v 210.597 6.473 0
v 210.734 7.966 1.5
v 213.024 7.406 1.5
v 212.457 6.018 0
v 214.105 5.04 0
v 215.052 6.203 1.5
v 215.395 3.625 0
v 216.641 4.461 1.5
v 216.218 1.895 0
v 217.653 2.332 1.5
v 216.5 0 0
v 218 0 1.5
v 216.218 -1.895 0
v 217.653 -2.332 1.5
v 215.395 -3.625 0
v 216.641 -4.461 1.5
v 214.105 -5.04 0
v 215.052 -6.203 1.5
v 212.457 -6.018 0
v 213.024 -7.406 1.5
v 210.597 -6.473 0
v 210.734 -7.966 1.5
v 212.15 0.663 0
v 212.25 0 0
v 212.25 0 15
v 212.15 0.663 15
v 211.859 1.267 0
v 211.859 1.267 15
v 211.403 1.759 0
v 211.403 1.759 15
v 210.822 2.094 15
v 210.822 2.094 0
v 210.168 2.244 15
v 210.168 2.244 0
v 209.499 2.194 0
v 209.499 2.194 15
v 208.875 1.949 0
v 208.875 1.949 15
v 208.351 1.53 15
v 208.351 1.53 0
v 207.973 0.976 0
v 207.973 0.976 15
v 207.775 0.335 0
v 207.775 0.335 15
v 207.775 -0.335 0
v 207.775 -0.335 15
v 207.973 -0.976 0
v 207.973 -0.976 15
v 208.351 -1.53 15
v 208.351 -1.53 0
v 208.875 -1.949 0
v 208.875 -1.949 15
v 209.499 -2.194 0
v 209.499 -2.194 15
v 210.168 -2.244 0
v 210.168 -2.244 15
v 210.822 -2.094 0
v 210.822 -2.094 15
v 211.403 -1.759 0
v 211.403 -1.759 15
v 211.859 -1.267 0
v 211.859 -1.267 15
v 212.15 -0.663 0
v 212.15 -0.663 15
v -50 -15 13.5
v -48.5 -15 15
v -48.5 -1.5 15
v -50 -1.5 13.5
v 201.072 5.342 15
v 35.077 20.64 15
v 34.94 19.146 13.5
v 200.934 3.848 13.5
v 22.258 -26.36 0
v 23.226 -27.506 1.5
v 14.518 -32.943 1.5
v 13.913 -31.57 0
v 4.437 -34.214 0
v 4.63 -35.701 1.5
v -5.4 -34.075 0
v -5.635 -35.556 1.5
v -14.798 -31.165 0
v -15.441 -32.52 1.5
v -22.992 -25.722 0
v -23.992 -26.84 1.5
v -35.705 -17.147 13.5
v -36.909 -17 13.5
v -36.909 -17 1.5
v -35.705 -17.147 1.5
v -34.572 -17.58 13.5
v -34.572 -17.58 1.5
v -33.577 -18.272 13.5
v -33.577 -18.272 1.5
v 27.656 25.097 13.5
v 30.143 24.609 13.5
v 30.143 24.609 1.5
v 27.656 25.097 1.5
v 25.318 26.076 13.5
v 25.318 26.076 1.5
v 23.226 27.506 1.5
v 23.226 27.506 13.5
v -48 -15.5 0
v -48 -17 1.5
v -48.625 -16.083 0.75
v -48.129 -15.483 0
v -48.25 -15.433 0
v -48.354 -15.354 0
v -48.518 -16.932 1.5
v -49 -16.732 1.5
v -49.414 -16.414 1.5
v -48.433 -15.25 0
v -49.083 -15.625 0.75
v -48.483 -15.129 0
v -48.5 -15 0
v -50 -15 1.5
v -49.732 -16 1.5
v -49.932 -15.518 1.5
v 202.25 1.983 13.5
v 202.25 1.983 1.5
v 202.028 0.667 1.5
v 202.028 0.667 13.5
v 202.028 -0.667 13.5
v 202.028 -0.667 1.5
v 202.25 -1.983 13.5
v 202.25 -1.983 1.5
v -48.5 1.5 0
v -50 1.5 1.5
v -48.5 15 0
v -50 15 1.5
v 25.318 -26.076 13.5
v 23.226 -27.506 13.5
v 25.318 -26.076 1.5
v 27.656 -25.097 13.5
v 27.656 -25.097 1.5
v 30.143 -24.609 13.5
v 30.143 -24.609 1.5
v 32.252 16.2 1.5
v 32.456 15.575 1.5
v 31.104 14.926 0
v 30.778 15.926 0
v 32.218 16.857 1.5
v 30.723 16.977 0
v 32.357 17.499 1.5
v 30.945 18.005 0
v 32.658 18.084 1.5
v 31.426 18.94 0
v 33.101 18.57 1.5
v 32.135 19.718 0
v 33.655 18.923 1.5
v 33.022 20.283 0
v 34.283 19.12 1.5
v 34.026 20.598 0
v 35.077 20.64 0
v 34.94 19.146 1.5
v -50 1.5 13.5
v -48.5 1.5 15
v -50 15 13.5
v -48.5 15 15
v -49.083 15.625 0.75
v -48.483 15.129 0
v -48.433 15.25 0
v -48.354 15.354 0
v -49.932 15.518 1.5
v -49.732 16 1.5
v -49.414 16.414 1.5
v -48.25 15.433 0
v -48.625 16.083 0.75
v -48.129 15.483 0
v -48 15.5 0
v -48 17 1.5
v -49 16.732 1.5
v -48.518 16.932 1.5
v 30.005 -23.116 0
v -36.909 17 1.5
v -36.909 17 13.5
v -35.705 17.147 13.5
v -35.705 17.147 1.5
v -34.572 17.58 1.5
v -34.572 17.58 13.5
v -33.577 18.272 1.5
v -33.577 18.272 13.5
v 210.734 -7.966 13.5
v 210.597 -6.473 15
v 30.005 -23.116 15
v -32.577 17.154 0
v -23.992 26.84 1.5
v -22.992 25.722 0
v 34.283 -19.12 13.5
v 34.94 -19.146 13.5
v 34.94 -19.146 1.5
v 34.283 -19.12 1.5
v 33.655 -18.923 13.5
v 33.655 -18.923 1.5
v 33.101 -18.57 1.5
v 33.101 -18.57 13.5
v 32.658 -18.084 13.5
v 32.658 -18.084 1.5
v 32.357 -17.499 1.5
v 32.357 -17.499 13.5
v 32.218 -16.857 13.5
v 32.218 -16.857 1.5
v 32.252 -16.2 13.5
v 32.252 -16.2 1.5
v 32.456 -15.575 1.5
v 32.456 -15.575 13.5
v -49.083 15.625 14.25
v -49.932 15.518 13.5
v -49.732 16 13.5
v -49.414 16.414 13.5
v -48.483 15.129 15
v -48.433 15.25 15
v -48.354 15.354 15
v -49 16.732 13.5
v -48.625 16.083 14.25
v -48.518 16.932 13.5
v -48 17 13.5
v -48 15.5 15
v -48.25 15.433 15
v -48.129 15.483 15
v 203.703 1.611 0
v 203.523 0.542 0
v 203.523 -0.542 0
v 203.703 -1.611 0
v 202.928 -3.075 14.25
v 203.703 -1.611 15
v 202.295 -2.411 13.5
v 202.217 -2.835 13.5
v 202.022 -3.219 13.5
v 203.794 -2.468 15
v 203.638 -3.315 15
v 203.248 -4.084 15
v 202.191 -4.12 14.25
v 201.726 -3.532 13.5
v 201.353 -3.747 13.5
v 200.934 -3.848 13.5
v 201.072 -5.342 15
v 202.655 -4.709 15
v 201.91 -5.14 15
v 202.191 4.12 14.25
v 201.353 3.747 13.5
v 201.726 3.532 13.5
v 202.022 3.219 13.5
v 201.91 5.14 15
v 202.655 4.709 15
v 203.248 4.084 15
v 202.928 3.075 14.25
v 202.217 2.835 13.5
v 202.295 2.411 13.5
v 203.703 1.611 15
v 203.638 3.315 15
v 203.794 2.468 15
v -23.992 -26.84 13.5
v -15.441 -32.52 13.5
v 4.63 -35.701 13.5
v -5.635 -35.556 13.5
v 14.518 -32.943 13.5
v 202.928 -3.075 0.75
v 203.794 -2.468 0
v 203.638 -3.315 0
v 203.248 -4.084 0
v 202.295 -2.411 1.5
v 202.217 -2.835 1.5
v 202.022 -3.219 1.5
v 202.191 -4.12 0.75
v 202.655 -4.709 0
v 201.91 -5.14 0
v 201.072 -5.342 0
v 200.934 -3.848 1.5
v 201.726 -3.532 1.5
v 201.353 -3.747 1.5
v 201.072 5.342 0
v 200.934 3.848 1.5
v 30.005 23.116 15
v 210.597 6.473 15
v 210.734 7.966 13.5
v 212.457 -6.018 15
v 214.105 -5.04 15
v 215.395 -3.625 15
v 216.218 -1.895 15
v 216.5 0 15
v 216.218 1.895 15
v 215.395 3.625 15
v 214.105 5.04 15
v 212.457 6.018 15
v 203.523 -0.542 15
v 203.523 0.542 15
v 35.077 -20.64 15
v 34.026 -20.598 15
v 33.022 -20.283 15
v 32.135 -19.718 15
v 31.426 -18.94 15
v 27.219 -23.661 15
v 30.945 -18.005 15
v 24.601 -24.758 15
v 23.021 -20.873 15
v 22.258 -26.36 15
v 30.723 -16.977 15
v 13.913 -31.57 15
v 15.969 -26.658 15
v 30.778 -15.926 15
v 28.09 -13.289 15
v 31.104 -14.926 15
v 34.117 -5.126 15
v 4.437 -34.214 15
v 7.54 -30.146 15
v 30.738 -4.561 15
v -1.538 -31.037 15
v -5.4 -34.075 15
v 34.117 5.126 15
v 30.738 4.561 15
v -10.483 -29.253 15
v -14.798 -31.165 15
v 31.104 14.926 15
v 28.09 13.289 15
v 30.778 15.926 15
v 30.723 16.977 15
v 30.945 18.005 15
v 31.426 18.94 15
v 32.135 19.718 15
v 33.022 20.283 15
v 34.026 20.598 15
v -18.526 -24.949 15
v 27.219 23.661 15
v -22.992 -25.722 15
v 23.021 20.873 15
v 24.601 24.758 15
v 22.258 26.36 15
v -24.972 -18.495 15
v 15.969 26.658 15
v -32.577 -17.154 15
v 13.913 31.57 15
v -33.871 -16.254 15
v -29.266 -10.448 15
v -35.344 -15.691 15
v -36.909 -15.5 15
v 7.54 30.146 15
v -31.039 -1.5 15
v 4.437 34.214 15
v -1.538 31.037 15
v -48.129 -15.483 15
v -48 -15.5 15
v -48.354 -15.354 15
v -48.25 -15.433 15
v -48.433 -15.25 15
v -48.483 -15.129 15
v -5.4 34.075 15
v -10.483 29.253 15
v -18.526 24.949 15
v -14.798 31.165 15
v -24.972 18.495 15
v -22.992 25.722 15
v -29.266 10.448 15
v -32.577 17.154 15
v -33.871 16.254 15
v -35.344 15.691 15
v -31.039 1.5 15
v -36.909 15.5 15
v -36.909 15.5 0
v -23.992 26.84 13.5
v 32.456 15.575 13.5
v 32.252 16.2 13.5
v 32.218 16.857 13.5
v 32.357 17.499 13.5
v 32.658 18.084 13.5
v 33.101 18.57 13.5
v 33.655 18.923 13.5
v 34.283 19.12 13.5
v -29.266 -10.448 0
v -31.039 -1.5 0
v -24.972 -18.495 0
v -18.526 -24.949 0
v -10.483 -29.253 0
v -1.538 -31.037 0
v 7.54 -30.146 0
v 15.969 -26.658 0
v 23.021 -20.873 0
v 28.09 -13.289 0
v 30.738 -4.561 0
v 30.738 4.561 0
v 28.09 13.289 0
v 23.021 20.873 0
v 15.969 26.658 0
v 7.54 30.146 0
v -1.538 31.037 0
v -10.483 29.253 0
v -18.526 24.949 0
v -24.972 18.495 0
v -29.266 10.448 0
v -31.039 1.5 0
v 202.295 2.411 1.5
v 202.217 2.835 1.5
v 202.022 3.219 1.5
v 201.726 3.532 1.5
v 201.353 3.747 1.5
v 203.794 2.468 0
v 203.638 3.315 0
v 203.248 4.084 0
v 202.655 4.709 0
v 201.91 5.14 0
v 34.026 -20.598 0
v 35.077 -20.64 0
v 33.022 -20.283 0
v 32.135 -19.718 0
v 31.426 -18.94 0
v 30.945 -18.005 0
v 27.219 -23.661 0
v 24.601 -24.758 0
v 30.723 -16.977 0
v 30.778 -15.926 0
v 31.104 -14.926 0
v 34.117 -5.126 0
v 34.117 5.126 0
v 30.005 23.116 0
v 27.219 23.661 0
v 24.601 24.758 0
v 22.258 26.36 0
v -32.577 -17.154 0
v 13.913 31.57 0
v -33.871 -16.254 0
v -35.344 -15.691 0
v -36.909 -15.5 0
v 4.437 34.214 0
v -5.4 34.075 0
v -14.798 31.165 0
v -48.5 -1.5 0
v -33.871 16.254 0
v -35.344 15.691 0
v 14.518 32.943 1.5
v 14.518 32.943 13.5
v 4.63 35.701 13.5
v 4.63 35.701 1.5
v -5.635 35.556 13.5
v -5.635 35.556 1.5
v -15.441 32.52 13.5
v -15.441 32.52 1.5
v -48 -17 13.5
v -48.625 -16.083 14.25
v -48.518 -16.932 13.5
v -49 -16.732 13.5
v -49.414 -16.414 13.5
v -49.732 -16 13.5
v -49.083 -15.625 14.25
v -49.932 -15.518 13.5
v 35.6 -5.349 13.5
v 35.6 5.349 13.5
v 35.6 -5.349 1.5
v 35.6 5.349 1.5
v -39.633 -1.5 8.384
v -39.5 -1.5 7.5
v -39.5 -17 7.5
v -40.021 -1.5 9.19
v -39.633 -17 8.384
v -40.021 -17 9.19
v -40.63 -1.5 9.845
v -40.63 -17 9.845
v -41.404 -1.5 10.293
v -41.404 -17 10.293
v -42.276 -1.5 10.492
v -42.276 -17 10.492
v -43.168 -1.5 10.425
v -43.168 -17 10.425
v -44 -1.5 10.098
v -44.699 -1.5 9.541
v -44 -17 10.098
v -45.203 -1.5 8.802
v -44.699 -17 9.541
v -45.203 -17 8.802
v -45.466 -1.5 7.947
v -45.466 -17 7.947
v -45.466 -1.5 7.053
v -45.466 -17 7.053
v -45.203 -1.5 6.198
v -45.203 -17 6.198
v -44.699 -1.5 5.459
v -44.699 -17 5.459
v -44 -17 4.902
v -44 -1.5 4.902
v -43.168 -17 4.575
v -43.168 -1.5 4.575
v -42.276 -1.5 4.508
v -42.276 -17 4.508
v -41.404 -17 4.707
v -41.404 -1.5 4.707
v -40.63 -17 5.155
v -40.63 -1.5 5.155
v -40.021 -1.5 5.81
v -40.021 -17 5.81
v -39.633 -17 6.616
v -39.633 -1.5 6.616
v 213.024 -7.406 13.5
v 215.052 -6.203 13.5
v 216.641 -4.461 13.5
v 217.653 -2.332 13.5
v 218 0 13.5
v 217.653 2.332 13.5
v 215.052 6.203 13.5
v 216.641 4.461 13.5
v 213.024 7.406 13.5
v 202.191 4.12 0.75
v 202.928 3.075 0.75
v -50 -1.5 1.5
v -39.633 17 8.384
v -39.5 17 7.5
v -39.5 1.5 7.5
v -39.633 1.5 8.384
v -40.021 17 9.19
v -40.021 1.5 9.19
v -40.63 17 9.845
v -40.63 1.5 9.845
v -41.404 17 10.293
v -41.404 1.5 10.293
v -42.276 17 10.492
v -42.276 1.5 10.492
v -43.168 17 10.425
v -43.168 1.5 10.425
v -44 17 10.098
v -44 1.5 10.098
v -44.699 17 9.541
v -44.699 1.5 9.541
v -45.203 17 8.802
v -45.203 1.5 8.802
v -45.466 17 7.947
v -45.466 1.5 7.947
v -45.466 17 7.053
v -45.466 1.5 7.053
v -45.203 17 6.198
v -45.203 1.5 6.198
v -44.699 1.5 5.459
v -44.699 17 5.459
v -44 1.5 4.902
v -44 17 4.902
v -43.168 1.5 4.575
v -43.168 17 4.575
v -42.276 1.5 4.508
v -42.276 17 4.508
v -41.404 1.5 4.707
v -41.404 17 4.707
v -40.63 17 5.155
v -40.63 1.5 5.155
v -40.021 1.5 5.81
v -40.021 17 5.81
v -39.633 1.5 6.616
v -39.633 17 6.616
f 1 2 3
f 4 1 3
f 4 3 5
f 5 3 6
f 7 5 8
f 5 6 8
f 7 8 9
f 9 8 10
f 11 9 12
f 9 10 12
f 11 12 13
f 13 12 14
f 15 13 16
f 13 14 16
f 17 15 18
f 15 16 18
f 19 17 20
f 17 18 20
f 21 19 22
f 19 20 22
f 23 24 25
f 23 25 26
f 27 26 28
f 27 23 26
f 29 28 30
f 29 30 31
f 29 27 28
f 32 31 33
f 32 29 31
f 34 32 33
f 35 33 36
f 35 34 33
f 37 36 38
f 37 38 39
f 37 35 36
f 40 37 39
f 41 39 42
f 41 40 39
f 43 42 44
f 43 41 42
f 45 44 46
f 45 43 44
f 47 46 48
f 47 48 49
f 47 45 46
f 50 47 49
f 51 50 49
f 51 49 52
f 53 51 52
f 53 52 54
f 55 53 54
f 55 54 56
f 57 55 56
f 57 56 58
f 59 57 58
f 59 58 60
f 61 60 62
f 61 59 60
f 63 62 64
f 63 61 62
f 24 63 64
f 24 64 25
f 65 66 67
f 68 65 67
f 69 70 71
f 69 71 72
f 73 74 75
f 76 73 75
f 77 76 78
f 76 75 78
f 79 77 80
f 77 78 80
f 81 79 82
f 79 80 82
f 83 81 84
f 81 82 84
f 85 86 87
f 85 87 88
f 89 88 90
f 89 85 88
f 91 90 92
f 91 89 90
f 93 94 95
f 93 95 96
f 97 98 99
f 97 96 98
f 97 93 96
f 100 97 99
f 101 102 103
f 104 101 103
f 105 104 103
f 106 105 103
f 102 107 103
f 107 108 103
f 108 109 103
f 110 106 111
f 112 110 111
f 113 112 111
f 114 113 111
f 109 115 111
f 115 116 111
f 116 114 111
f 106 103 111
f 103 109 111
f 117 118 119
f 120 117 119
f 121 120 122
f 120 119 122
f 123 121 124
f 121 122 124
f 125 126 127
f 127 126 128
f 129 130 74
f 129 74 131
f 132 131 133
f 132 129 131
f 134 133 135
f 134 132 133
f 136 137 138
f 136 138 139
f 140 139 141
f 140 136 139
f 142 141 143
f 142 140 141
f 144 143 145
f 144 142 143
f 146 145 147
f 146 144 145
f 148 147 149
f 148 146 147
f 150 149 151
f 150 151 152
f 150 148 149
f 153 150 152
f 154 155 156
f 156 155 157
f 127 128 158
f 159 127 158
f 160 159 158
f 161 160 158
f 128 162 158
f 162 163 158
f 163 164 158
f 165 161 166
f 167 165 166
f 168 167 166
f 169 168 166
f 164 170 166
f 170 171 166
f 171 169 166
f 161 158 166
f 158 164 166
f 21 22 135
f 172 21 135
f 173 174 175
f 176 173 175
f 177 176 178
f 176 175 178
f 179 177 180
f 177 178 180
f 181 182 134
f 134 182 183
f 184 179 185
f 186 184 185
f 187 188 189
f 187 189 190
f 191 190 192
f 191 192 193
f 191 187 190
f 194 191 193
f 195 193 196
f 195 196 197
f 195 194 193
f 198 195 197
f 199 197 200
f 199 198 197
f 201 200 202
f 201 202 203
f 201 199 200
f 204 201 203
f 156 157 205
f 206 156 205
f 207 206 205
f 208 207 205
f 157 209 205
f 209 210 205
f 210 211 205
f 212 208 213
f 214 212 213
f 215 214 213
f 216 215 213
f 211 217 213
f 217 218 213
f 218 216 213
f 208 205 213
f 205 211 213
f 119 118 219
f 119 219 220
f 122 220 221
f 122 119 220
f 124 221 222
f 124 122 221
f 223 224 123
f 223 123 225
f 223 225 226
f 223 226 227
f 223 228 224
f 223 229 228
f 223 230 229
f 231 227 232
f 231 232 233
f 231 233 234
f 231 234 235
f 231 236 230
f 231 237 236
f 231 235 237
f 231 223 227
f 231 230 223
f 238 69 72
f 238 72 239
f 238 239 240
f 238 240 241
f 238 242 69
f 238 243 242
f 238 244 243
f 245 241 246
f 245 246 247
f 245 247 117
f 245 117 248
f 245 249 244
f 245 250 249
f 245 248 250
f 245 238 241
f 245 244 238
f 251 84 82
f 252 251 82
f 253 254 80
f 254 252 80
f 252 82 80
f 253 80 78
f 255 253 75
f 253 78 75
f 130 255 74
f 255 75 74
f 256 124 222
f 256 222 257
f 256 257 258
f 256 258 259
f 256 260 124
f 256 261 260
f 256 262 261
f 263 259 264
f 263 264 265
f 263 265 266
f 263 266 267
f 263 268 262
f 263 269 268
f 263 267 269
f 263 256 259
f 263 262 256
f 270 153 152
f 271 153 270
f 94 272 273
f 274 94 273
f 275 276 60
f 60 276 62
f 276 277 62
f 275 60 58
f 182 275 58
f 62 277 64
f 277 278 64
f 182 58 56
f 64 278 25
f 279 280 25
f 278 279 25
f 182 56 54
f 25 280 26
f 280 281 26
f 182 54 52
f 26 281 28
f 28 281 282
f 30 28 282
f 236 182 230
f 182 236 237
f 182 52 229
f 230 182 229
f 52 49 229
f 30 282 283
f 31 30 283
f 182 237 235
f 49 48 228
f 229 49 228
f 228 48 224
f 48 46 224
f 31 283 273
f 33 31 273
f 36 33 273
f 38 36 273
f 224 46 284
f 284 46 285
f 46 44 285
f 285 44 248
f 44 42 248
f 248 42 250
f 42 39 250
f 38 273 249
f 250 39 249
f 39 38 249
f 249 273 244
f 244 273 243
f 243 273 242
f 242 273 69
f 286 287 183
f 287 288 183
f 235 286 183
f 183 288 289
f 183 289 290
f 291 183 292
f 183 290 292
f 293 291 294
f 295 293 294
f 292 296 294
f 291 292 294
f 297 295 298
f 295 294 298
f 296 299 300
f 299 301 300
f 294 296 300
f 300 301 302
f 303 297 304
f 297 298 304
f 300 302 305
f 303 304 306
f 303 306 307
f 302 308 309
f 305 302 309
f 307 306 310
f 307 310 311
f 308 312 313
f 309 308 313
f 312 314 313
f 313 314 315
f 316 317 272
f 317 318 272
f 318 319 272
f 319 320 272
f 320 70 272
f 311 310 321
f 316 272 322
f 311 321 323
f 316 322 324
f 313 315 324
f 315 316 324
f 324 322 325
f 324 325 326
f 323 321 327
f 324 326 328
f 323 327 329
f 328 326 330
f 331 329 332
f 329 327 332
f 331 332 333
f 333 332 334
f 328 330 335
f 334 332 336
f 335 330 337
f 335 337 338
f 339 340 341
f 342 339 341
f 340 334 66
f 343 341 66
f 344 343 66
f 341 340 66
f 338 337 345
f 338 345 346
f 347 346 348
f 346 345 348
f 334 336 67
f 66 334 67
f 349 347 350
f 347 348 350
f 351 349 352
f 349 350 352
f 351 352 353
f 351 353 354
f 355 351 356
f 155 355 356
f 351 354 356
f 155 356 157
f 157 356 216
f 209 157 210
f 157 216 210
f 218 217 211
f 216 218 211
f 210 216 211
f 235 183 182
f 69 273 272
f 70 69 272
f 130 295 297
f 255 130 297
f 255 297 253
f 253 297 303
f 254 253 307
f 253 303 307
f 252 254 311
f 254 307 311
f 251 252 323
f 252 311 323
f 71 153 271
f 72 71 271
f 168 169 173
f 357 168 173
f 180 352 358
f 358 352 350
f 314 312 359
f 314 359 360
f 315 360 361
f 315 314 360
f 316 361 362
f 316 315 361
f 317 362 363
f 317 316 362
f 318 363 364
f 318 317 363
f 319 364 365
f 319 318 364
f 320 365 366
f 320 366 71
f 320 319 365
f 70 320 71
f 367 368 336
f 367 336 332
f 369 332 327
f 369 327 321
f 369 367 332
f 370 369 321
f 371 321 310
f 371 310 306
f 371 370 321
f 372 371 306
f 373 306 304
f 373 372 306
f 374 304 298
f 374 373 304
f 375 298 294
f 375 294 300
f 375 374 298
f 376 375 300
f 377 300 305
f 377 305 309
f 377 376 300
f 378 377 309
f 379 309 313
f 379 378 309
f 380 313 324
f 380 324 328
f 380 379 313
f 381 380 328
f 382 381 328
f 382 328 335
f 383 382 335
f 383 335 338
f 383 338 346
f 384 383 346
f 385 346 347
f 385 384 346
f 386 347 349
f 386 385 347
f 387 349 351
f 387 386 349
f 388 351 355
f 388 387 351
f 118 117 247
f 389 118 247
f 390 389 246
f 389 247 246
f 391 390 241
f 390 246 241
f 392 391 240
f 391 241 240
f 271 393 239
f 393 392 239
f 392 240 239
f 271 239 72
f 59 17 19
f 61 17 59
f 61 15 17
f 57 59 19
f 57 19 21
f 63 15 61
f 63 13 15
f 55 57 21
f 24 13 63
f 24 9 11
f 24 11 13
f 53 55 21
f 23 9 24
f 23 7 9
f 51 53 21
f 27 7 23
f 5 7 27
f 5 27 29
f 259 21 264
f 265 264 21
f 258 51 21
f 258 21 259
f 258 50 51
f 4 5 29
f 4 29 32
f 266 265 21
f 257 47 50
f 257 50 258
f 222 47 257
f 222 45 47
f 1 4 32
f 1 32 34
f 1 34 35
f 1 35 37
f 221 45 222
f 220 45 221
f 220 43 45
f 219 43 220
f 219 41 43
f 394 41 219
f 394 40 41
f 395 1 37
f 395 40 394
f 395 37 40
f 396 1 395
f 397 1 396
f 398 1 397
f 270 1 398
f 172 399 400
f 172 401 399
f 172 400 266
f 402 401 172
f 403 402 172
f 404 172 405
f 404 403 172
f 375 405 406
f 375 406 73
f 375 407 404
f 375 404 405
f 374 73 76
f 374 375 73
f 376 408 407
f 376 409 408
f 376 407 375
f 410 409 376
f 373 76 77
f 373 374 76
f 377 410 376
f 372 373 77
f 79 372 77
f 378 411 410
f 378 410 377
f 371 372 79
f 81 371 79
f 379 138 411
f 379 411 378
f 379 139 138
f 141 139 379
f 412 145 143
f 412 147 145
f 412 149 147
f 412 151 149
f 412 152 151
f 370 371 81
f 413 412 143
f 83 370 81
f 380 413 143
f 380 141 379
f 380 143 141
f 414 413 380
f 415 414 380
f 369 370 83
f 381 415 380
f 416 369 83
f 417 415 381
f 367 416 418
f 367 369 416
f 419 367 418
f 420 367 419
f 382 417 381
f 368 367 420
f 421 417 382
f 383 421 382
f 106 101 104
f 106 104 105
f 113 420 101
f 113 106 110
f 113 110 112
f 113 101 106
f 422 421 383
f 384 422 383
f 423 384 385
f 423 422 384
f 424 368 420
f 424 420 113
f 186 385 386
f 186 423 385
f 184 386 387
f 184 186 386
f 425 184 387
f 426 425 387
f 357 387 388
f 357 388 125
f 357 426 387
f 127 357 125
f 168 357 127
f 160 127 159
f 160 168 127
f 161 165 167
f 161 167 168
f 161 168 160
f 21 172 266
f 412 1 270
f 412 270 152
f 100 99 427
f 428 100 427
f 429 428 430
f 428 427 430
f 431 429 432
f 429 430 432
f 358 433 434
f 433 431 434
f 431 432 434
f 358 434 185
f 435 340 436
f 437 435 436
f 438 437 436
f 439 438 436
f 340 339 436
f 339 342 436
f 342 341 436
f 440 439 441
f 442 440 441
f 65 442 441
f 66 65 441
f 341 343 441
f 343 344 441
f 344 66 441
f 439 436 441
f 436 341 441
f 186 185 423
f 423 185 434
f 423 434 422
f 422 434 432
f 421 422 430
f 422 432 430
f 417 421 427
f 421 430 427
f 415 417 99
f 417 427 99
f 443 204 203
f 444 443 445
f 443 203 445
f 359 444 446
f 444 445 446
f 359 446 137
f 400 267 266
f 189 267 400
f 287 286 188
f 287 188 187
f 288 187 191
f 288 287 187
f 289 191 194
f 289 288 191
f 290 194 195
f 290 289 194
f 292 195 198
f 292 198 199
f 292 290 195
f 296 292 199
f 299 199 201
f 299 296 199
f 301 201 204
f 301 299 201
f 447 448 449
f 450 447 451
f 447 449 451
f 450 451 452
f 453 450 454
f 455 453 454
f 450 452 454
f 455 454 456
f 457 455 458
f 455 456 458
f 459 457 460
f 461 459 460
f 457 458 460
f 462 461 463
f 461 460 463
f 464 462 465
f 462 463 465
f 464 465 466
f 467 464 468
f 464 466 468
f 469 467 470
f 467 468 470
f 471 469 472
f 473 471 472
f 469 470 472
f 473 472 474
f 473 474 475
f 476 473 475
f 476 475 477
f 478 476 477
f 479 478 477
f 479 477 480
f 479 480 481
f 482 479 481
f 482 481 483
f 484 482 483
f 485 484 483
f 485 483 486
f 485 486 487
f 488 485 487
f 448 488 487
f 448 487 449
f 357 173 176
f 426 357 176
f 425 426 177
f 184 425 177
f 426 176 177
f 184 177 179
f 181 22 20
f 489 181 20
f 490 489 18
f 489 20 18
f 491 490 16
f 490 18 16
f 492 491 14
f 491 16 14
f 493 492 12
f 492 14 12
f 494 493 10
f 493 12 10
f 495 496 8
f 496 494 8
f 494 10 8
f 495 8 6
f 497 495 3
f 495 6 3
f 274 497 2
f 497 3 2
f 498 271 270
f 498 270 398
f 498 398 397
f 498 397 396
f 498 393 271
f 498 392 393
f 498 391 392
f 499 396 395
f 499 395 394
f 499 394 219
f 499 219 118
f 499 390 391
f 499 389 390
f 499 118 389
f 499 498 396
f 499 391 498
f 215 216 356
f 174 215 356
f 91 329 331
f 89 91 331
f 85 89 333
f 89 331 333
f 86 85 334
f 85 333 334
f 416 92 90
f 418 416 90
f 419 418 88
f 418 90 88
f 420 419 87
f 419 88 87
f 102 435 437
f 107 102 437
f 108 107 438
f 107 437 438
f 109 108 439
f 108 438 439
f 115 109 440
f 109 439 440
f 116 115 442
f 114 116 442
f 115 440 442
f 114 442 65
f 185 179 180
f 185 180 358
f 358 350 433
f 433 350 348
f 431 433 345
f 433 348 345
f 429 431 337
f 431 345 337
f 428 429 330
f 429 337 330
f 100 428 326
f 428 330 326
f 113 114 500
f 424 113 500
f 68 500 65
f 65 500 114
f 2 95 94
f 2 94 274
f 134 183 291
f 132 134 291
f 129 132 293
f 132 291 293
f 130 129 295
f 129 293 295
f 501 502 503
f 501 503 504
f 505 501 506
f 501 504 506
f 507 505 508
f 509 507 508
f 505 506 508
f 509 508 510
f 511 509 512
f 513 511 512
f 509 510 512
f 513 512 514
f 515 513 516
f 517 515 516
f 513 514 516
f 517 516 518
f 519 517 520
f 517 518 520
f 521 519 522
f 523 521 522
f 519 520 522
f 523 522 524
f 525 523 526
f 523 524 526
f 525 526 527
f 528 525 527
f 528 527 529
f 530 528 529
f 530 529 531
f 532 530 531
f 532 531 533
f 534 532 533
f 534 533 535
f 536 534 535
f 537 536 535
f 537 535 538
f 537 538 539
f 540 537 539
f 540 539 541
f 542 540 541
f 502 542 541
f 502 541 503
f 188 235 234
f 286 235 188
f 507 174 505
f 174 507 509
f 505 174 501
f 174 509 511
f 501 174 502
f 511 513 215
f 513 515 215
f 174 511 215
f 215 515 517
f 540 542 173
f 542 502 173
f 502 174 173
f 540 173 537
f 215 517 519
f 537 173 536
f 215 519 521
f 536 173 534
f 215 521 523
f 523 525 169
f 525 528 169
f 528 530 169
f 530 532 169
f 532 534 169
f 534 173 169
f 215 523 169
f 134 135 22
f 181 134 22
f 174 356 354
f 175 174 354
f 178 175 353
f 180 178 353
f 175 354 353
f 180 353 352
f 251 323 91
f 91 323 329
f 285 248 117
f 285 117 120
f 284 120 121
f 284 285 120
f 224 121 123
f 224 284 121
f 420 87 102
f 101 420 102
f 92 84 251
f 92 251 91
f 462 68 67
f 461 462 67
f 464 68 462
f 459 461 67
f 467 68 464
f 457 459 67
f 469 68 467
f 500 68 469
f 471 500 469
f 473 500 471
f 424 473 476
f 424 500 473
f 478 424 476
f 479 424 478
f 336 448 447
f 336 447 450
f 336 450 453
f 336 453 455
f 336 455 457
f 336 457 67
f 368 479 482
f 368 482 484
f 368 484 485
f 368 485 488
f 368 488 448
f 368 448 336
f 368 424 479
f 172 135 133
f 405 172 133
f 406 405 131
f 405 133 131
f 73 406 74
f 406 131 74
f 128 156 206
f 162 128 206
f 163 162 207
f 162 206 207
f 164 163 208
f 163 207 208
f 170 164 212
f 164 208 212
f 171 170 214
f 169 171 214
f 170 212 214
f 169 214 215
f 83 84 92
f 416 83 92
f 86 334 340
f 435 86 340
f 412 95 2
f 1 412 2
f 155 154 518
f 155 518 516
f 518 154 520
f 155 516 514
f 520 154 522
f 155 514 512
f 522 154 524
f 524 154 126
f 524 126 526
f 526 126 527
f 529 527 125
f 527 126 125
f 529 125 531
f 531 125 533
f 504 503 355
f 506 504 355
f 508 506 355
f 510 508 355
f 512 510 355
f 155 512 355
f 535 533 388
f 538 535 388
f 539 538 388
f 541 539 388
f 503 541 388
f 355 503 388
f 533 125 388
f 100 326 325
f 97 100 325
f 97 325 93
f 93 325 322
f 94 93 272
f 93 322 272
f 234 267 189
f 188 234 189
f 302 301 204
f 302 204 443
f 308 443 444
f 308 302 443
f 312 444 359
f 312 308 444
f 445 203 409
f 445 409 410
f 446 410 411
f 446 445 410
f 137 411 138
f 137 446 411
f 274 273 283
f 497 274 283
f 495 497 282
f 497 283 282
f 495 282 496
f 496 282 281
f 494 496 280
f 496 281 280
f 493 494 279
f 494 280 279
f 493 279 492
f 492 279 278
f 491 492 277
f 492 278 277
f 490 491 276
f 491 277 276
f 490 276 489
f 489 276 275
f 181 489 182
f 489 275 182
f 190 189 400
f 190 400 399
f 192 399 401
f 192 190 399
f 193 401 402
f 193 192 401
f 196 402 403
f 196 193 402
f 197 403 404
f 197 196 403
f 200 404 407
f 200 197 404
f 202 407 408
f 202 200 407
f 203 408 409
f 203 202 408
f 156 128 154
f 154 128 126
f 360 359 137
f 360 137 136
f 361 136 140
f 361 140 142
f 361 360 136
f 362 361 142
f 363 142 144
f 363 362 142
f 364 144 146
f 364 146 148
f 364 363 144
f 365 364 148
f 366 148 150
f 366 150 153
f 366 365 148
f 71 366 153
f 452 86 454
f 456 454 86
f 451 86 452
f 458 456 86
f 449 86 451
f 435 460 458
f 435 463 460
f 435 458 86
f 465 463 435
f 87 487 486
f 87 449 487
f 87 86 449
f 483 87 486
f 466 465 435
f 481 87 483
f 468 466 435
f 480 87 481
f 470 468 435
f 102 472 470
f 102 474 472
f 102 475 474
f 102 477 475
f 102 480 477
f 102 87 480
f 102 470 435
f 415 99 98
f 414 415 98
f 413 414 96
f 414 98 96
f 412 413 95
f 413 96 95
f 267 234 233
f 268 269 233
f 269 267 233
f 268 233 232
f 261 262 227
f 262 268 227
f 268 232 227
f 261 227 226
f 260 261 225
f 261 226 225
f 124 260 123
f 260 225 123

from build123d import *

# Parameters (mm, degrees)
SKETCH_R     = 2.25
PAD_DEPTH    = 15
SKETCH001_R  = 3
HOLE_DEPTH   = 53.001
FILLET_R     = 5
FILLET001_R  = 2
FILLET002_R  = 12.5
FILLET003_R  = 2.5
FILLET004_R  = 1.5
CHAMFER_SIZE = 1.5


with BuildPart() as part:
    # Sketch → Pad (new body)
    with BuildSketch(Plane.XY):
        with BuildLine():
            ThreePointArc((-31.038776, -1.5), (31.075, 0), (-31.038776, 1.5))
            Line((-50, 1.5), (-31.038776, 1.5))
            Line((-50, 17), (-50, 1.5))
            Line((-35, 17), (-50, 17))
            Line((-35, 17), (-23.992027, 26.839945))
            ThreePointArc((25.903668, 25), (1.326628, 35.975548), (-23.992027, 26.839945))
            Line((25.903668, 25), (210.734184, 7.96624))
            ThreePointArc((210.734184, -7.96624), (218, 0), (210.734184, 7.96624))
            Line((25.903668, -25), (210.734184, -7.96624))
            ThreePointArc((-23.992027, -26.839945), (1.326628, -35.975548), (25.903668, -25))
            Line((-23.992027, -26.839945), (-35, -17))
            Line((-35, -17), (-50, -17))
            Line((-50, -1.5), (-50, -17))
            Line((-50, -1.5), (-31.038776, -1.5))
        make_face()
        with Locations((210, 0)):
            Circle(SKETCH_R, mode=Mode.SUBTRACT)
        with BuildLine():
            ThreePointArc((202.890406, 3.667925), (202, 0), (202.890406, -3.667925))
            Line((202.890406, -3.667925), (30.208298, -19.582102))
            ThreePointArc((30.208298, -19.582102), (36, 0), (30.208298, 19.582102))
            Line((30.208298, 19.582102), (202.890406, 3.667925))
        make_face(mode=Mode.SUBTRACT)
    extrude(amount=PAD_DEPTH)

    # Sketch001 (on Face13 of Pad) → Hole (cut, through all)
    with BuildSketch(Plane.XZ.offset(17)):
        with Locations((-42.5, 7.5)):
            Circle(SKETCH001_R)
    extrude(amount=-HOLE_DEPTH, mode=Mode.SUBTRACT)

    # Fillet
    fillet_edges = [part.edges().sort_by_distance(p)[0] for p in [
        (-35, -17, 7.5),
        (-35, 17, 7.5),
    ]]
    fillet(fillet_edges, radius=FILLET_R)

    # Fillet001
    fillet001_edges = [part.edges().sort_by_distance(p)[0] for p in [
        (-50, 17, 7.5),
        (-50, -17, 7.5),
    ]]
    fillet(fillet001_edges, radius=FILLET001_R)

    # Fillet002
    fillet002_edges = [part.edges().sort_by_distance(p)[0] for p in [
        (25.903668, -25, 7.5),
        (25.903668, 25, 7.5),
    ]]
    fillet(fillet002_edges, radius=FILLET002_R)

    # Fillet003
    fillet003_edges = [part.edges().sort_by_distance(p)[0] for p in [
        (30.208298, -19.582102, 7.5),
        (30.208298, 19.582102, 7.5),
    ]]
    fillet(fillet003_edges, radius=FILLET003_R)

    # Fillet004
    fillet004_edges = [part.edges().sort_by_distance(p)[0] for p in [
        (202.890406, 3.667925, 7.5),
        (202.890406, -3.667925, 7.5),
    ]]
    fillet(fillet004_edges, radius=FILLET004_R)

    # Chamfer
    chamfer_edges = [part.edges().sort_by_distance(p)[0] for p in [
        (120.438497, 16.287783, 15),
        (120.438497, 16.287783, 0),
        (117.936912, 11.497137, 15),
        (117.936912, 11.497137, 0),
    ]]
    chamfer(chamfer_edges, length=CHAMFER_SIZE)


solid = part.part
